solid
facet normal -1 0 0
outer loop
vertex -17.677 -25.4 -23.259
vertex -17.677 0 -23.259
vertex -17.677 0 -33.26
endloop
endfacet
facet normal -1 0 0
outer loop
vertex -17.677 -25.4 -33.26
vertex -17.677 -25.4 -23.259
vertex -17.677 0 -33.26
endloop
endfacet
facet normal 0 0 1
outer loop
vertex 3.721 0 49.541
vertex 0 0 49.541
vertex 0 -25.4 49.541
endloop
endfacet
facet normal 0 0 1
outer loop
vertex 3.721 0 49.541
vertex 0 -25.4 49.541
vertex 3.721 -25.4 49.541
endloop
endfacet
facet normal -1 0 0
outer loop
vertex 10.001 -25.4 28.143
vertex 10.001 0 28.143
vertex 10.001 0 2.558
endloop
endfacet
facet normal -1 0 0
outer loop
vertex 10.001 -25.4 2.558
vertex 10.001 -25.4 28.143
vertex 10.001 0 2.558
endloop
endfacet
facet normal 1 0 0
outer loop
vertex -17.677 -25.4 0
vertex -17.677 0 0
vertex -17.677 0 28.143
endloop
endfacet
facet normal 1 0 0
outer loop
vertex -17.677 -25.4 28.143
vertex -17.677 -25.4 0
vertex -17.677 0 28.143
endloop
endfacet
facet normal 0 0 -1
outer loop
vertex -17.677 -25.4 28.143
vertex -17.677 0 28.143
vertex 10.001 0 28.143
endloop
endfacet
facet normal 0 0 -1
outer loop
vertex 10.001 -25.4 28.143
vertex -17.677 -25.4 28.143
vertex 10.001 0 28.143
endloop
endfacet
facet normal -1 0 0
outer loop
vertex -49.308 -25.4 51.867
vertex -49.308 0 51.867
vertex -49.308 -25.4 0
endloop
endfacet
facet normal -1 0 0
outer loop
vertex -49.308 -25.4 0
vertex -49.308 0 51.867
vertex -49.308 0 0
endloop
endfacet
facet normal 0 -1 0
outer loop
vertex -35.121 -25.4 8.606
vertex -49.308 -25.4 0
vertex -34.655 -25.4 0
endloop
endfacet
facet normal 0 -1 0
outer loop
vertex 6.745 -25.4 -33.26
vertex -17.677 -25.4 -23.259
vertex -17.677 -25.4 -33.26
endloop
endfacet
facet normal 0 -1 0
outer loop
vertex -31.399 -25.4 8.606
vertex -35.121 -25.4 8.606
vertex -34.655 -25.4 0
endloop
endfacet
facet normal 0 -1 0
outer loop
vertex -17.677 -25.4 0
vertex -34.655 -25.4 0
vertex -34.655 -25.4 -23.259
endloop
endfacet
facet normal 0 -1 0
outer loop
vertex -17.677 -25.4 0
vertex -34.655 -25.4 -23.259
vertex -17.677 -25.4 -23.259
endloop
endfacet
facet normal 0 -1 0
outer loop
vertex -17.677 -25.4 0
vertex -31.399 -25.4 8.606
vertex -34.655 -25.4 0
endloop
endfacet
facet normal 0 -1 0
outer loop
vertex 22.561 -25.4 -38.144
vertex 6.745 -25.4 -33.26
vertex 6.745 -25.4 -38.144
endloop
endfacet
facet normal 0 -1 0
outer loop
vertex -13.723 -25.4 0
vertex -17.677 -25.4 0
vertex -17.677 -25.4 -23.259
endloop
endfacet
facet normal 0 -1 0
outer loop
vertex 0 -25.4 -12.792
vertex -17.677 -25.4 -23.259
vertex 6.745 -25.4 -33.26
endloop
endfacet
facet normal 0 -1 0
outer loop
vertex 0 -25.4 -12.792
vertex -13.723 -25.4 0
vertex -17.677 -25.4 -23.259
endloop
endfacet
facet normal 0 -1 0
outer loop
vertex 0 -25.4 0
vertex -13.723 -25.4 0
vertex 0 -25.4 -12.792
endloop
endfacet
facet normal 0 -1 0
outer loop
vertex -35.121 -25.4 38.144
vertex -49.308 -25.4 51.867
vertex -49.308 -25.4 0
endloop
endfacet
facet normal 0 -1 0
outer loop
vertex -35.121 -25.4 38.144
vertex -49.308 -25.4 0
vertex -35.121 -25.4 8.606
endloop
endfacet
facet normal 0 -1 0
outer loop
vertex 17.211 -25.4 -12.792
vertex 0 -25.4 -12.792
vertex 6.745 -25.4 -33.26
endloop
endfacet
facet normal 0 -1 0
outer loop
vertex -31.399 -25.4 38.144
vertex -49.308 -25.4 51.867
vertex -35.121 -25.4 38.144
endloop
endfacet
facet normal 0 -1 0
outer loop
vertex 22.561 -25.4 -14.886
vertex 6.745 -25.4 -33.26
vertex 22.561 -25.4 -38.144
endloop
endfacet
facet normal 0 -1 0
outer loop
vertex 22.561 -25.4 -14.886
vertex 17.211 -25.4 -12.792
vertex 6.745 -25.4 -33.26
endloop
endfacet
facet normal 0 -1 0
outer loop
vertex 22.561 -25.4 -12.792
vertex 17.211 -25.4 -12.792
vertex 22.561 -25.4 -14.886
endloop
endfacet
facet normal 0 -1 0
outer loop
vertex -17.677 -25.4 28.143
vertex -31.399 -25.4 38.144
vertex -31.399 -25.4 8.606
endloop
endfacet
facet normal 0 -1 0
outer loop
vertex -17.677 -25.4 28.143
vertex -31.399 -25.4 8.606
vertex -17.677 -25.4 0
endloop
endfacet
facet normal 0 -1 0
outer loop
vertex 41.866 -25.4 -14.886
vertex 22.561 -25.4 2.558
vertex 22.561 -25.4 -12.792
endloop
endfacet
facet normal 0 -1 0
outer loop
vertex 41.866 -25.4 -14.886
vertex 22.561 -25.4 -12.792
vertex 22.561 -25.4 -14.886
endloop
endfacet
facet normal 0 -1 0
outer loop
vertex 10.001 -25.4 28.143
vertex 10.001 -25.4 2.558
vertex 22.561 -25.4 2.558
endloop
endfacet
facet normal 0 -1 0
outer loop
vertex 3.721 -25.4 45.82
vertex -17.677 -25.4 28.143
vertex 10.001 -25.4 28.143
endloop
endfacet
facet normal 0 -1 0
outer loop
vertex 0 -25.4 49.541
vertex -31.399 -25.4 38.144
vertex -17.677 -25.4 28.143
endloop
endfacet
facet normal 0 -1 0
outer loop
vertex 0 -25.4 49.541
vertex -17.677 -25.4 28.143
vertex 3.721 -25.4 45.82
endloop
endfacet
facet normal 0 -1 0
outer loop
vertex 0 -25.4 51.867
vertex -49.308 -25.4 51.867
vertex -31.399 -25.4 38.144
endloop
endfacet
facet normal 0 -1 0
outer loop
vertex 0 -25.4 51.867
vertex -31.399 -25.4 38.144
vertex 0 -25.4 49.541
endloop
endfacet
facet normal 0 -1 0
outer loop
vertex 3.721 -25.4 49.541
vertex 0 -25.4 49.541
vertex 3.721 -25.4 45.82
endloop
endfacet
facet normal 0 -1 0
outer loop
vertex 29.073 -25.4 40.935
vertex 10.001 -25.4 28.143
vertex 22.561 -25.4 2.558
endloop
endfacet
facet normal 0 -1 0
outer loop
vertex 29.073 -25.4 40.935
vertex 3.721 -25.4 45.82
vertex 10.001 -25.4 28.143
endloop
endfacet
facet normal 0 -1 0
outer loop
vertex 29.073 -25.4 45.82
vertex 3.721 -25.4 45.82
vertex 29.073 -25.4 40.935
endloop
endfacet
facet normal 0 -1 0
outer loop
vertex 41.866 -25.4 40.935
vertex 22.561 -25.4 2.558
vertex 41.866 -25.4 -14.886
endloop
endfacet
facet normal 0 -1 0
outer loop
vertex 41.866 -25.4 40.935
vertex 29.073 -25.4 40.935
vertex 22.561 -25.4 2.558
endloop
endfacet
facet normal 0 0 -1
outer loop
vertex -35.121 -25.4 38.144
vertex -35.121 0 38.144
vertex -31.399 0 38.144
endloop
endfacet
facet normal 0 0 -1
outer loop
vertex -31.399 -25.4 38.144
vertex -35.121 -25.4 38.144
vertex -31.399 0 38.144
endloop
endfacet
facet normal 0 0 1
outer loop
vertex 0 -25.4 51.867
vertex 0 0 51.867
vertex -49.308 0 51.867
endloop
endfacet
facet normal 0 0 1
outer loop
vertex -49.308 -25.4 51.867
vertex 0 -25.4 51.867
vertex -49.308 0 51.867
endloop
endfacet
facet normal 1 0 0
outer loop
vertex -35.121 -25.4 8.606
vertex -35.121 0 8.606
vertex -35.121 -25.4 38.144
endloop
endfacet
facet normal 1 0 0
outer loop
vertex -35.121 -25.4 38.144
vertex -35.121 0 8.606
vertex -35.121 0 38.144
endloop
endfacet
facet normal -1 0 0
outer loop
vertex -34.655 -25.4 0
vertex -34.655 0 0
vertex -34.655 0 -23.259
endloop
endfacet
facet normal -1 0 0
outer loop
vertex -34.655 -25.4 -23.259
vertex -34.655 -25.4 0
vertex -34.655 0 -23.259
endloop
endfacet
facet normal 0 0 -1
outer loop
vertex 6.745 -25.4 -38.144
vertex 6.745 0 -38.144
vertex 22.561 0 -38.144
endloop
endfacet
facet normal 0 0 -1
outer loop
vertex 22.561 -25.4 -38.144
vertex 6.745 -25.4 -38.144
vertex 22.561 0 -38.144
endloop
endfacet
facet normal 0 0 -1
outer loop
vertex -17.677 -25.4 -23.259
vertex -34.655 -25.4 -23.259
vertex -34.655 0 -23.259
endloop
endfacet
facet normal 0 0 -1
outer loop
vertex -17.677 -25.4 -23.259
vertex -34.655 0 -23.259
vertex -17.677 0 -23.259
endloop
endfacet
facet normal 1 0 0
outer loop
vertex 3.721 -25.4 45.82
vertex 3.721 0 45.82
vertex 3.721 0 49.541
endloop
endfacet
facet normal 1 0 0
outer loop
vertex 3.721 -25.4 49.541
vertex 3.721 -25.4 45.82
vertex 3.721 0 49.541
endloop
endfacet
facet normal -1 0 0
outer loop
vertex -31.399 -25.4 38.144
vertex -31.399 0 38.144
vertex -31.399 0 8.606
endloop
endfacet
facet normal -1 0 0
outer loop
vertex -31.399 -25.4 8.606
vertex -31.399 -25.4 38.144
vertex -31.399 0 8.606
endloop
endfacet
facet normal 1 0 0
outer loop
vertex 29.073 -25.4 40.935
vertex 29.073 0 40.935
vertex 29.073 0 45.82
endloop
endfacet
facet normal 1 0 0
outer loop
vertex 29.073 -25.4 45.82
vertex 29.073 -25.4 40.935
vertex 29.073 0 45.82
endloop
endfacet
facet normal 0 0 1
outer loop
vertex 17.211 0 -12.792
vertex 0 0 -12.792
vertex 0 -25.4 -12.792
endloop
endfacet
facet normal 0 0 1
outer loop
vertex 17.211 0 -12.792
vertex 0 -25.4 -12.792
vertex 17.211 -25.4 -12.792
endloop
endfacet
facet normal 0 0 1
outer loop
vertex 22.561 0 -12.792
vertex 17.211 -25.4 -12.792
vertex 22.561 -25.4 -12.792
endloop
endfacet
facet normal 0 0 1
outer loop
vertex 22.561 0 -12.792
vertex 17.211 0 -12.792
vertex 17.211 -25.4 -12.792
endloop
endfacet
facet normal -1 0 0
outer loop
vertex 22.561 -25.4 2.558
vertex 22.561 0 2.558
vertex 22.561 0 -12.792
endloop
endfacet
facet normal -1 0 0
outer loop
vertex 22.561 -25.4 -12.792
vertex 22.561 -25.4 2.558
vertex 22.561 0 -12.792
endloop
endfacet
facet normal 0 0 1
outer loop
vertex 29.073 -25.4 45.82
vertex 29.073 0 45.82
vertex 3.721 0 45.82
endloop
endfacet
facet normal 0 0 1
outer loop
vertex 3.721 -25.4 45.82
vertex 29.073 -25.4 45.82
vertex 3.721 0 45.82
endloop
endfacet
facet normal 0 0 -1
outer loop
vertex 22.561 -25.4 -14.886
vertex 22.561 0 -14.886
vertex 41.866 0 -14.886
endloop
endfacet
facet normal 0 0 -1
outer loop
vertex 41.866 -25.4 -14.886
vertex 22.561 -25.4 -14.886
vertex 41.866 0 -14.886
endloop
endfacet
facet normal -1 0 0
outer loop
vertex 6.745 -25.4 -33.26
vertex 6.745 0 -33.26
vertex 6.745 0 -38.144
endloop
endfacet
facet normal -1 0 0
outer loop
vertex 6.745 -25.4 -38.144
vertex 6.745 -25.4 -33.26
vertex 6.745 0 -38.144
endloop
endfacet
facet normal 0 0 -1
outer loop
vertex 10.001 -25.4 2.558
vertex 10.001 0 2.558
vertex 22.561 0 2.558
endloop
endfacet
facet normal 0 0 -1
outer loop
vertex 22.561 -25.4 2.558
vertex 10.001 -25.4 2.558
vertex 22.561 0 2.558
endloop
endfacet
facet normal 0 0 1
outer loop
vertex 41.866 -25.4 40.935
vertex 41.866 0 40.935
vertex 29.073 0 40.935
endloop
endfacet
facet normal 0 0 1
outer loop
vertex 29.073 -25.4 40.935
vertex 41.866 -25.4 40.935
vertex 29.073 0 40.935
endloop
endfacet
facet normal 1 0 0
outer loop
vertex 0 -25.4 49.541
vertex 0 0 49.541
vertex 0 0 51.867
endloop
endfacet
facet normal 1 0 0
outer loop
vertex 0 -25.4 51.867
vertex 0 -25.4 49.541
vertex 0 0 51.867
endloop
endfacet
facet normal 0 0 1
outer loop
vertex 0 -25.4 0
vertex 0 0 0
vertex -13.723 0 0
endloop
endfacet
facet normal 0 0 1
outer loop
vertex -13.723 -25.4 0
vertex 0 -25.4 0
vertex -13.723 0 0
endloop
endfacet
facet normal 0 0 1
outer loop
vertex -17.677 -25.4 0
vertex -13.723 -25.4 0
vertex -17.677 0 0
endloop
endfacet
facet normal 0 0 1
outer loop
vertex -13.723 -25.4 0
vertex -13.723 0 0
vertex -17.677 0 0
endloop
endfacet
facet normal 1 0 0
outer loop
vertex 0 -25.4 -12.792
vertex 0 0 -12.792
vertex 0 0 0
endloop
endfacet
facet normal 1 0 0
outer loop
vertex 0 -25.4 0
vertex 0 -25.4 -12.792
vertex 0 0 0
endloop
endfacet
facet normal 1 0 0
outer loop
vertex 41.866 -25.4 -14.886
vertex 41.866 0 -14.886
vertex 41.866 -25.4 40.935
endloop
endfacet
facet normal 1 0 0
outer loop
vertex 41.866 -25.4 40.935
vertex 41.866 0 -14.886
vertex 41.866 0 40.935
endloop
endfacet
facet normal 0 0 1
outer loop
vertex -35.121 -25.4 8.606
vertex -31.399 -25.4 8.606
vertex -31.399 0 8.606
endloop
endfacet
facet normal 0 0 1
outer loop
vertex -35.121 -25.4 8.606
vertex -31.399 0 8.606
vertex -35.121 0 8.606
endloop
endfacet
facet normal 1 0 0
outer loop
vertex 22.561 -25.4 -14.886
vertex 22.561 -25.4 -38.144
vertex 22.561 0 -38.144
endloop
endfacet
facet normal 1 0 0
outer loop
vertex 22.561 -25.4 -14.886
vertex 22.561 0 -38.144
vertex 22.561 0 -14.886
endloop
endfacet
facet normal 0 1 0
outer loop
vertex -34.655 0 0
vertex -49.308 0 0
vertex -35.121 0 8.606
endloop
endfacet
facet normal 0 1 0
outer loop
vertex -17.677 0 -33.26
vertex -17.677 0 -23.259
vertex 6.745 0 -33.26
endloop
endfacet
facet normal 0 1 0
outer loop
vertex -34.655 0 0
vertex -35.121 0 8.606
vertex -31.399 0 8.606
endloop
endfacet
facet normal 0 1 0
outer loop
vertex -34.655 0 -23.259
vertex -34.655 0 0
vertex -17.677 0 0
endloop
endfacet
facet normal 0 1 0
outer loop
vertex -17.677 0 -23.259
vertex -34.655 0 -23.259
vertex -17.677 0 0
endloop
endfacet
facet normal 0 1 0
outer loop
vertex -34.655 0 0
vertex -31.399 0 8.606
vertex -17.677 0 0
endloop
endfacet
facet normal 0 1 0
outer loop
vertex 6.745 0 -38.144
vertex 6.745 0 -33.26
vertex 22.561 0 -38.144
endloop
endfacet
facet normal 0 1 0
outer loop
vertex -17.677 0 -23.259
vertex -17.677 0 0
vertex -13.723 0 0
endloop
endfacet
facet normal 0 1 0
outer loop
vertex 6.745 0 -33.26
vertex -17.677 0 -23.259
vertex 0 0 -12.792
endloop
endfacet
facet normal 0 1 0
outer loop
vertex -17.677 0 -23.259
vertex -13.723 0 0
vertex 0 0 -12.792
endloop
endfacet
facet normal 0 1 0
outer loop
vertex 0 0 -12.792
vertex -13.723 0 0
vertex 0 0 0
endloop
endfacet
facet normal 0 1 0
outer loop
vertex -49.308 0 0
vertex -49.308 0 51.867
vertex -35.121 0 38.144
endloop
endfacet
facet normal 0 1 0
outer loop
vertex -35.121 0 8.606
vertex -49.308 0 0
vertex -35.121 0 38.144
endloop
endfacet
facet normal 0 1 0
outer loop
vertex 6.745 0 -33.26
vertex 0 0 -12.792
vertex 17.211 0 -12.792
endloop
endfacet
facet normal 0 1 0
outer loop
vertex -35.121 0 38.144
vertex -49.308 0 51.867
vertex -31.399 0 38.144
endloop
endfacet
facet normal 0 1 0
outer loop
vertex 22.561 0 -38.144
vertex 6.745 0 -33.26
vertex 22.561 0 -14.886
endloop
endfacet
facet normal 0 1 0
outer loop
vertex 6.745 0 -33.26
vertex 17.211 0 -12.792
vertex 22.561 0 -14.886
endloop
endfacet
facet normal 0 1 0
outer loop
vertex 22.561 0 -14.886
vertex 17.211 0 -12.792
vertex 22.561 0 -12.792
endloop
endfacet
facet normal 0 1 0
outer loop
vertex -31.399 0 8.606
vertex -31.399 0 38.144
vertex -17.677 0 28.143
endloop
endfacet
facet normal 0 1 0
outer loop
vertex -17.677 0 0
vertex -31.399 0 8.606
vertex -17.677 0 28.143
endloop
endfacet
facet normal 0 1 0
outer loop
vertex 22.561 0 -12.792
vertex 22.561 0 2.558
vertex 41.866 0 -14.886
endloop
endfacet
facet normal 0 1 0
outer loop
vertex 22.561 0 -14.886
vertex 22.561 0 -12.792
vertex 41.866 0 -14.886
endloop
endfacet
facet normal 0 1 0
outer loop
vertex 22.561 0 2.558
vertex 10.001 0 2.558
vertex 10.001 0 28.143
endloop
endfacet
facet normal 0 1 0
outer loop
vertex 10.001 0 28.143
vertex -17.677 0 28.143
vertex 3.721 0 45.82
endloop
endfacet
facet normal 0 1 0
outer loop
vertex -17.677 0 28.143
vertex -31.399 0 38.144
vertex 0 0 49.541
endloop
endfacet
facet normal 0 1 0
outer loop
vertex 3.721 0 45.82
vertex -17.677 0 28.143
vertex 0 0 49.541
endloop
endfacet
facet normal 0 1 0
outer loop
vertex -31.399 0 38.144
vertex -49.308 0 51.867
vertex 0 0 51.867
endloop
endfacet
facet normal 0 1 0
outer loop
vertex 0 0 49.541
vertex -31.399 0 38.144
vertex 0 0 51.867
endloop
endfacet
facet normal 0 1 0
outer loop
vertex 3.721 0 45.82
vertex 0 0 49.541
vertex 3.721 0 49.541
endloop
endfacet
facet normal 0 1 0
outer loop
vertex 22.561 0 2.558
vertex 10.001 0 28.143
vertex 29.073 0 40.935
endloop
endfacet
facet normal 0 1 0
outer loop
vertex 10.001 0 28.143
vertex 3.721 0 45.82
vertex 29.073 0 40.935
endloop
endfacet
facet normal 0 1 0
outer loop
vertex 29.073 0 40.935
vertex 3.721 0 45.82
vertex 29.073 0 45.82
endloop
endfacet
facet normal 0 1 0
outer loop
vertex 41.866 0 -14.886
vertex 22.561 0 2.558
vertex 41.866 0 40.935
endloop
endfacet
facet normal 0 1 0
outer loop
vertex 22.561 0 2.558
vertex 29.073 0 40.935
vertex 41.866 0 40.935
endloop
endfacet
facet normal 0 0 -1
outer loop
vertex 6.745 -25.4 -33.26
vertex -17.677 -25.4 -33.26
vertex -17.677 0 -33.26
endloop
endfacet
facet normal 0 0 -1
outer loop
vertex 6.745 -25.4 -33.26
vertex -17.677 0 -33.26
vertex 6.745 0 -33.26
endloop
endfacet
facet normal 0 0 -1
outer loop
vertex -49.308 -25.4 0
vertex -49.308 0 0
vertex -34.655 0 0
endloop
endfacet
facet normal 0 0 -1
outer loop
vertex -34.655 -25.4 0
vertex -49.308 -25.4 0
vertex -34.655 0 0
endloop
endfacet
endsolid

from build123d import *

# Parameters (mm, degrees)
F0_W     = 3.7213962059
F0_H     = 17.6766254008
F0_H_2   = 3.7213973701
F0_W_2   = 3.2562217675
F0_H_3   = 20.467672497
F0_W_3   = 3.9539821446
F0_H_4   = 23.2587195933
F0_W_4   = 16.9788654894
F0_W_5   = 5.3495056927
F0_H_5   = 2.0932843909
F0_W_6   = 0.4651769996
F0_H_6   = 8.6057269946
F0_W_7   = 14.1878202558
F0_H_7   = 29.5385746285
F1_DEPTH = 25.4


with BuildPart() as f1:
    # F0 (on Front) → F1 (new body)
    with BuildSketch(Plane.XZ):
        Polygon((0, -12.7922967076), (0, 0), (-5.8146808296, 0), (-9.3034878373, 0), (-13.7226451188, 0), (-13.7226451188, -23.2587195933), (-17.6766272634, -23.2587195933), (-17.6766272634, -33.2599692047), (6.7450278439, -33.2599692047), (6.7450278439, -12.7922967076), align=None)
        Polygon((-13.7226451188, 28.1430520117), (0, 28.1430520117), (0, 45.8196774125), (0, 49.5410747826), (-35.1206697524, 49.5410747826), (-35.1206697524, 38.1443016231), (-31.3992723823, 38.1443016231), (-31.3992723823, 35.3532582521), (-13.7226451188, 35.3532582521), align=None)
        with Locations((1.860698103, 36.9813647121)):
            Rectangle(F0_W, F0_H)
        with Locations((1.860698103, 47.6803760976)):
            Rectangle(F0_W, F0_H_2)
        Polygon((-17.6766272634, 28.1430520117), (-13.7226451188, 28.1430520117), (-13.7226451188, 35.3532582521), (-31.3992723823, 35.3532582521), (-31.3992723823, 8.6057269946), (-34.6554927528, 8.6057269946), (-34.6554927528, 0), (-17.6766272634, 0), align=None)
        Polygon((3.7213962059, 45.8196774125), (3.7213962059, 28.1430520117), (10.0012496114, 28.1430520117), (10.0012496114, 2.558459295), (17.2114521265, 2.558459295), (17.2114521265, 40.9353487194), (29.0734022856, 40.9353487194), (29.0734022856, 45.8196774125), align=None)
        with Locations((8.3731387276, -23.0261329561)):
            Rectangle(F0_W_2, F0_H_3)
        with Locations((-15.6996361911, -11.6293597966)):
            Rectangle(F0_W_3, F0_H_4)
        Polygon((-35.1206697524, 49.5410747826), (0, 49.5410747826), (0, 51.8669486046), (-49.3084900081, 51.8669486046), (-49.3084900081, 38.1443016231), (-35.1206697524, 38.1443016231), align=None)
        Polygon((17.2114521265, -12.7922967076), (10.0012496114, -12.7922967076), (10.0012496114, -33.2599692047), (6.7450278439, -33.2599692047), (6.7450278439, -38.1443016231), (22.5609578192, -38.1443016231), (22.5609578192, -14.8855810985), (17.2114521265, -14.8855810985), align=None)
        with Locations((-26.1660600081, -11.6293597966)):
            Rectangle(F0_W_4, F0_H_4)
        with Locations((19.8862049729, -13.8389389031)):
            Rectangle(F0_W_5, F0_H_5)
        with Locations((-34.8880812526, 4.3028634973)):
            Rectangle(F0_W_6, F0_H_6)
        with Locations((-42.2145798802, 23.3750143088)):
            Rectangle(F0_W_7, F0_H_7)
        Polygon((41.8656989932, 40.9353487194), (29.0734022856, 40.9353487194), (29.0734022856, -12.7922967076), (22.5609578192, -12.7922967076), (22.5609578192, -14.8855810985), (41.8656989932, -14.8855810985), align=None)
        Polygon((29.0734022856, -12.7922967076), (29.0734022856, 40.9353487194), (17.2114521265, 40.9353487194), (17.2114521265, 2.558459295), (22.5609578192, 2.558459295), (22.5609578192, -12.7922967076), align=None)
        with Locations((-42.2145798802, 4.3028634973)):
            Rectangle(F0_W_7, F0_H_6)
    extrude(amount=F1_DEPTH)


solid = f1.part
